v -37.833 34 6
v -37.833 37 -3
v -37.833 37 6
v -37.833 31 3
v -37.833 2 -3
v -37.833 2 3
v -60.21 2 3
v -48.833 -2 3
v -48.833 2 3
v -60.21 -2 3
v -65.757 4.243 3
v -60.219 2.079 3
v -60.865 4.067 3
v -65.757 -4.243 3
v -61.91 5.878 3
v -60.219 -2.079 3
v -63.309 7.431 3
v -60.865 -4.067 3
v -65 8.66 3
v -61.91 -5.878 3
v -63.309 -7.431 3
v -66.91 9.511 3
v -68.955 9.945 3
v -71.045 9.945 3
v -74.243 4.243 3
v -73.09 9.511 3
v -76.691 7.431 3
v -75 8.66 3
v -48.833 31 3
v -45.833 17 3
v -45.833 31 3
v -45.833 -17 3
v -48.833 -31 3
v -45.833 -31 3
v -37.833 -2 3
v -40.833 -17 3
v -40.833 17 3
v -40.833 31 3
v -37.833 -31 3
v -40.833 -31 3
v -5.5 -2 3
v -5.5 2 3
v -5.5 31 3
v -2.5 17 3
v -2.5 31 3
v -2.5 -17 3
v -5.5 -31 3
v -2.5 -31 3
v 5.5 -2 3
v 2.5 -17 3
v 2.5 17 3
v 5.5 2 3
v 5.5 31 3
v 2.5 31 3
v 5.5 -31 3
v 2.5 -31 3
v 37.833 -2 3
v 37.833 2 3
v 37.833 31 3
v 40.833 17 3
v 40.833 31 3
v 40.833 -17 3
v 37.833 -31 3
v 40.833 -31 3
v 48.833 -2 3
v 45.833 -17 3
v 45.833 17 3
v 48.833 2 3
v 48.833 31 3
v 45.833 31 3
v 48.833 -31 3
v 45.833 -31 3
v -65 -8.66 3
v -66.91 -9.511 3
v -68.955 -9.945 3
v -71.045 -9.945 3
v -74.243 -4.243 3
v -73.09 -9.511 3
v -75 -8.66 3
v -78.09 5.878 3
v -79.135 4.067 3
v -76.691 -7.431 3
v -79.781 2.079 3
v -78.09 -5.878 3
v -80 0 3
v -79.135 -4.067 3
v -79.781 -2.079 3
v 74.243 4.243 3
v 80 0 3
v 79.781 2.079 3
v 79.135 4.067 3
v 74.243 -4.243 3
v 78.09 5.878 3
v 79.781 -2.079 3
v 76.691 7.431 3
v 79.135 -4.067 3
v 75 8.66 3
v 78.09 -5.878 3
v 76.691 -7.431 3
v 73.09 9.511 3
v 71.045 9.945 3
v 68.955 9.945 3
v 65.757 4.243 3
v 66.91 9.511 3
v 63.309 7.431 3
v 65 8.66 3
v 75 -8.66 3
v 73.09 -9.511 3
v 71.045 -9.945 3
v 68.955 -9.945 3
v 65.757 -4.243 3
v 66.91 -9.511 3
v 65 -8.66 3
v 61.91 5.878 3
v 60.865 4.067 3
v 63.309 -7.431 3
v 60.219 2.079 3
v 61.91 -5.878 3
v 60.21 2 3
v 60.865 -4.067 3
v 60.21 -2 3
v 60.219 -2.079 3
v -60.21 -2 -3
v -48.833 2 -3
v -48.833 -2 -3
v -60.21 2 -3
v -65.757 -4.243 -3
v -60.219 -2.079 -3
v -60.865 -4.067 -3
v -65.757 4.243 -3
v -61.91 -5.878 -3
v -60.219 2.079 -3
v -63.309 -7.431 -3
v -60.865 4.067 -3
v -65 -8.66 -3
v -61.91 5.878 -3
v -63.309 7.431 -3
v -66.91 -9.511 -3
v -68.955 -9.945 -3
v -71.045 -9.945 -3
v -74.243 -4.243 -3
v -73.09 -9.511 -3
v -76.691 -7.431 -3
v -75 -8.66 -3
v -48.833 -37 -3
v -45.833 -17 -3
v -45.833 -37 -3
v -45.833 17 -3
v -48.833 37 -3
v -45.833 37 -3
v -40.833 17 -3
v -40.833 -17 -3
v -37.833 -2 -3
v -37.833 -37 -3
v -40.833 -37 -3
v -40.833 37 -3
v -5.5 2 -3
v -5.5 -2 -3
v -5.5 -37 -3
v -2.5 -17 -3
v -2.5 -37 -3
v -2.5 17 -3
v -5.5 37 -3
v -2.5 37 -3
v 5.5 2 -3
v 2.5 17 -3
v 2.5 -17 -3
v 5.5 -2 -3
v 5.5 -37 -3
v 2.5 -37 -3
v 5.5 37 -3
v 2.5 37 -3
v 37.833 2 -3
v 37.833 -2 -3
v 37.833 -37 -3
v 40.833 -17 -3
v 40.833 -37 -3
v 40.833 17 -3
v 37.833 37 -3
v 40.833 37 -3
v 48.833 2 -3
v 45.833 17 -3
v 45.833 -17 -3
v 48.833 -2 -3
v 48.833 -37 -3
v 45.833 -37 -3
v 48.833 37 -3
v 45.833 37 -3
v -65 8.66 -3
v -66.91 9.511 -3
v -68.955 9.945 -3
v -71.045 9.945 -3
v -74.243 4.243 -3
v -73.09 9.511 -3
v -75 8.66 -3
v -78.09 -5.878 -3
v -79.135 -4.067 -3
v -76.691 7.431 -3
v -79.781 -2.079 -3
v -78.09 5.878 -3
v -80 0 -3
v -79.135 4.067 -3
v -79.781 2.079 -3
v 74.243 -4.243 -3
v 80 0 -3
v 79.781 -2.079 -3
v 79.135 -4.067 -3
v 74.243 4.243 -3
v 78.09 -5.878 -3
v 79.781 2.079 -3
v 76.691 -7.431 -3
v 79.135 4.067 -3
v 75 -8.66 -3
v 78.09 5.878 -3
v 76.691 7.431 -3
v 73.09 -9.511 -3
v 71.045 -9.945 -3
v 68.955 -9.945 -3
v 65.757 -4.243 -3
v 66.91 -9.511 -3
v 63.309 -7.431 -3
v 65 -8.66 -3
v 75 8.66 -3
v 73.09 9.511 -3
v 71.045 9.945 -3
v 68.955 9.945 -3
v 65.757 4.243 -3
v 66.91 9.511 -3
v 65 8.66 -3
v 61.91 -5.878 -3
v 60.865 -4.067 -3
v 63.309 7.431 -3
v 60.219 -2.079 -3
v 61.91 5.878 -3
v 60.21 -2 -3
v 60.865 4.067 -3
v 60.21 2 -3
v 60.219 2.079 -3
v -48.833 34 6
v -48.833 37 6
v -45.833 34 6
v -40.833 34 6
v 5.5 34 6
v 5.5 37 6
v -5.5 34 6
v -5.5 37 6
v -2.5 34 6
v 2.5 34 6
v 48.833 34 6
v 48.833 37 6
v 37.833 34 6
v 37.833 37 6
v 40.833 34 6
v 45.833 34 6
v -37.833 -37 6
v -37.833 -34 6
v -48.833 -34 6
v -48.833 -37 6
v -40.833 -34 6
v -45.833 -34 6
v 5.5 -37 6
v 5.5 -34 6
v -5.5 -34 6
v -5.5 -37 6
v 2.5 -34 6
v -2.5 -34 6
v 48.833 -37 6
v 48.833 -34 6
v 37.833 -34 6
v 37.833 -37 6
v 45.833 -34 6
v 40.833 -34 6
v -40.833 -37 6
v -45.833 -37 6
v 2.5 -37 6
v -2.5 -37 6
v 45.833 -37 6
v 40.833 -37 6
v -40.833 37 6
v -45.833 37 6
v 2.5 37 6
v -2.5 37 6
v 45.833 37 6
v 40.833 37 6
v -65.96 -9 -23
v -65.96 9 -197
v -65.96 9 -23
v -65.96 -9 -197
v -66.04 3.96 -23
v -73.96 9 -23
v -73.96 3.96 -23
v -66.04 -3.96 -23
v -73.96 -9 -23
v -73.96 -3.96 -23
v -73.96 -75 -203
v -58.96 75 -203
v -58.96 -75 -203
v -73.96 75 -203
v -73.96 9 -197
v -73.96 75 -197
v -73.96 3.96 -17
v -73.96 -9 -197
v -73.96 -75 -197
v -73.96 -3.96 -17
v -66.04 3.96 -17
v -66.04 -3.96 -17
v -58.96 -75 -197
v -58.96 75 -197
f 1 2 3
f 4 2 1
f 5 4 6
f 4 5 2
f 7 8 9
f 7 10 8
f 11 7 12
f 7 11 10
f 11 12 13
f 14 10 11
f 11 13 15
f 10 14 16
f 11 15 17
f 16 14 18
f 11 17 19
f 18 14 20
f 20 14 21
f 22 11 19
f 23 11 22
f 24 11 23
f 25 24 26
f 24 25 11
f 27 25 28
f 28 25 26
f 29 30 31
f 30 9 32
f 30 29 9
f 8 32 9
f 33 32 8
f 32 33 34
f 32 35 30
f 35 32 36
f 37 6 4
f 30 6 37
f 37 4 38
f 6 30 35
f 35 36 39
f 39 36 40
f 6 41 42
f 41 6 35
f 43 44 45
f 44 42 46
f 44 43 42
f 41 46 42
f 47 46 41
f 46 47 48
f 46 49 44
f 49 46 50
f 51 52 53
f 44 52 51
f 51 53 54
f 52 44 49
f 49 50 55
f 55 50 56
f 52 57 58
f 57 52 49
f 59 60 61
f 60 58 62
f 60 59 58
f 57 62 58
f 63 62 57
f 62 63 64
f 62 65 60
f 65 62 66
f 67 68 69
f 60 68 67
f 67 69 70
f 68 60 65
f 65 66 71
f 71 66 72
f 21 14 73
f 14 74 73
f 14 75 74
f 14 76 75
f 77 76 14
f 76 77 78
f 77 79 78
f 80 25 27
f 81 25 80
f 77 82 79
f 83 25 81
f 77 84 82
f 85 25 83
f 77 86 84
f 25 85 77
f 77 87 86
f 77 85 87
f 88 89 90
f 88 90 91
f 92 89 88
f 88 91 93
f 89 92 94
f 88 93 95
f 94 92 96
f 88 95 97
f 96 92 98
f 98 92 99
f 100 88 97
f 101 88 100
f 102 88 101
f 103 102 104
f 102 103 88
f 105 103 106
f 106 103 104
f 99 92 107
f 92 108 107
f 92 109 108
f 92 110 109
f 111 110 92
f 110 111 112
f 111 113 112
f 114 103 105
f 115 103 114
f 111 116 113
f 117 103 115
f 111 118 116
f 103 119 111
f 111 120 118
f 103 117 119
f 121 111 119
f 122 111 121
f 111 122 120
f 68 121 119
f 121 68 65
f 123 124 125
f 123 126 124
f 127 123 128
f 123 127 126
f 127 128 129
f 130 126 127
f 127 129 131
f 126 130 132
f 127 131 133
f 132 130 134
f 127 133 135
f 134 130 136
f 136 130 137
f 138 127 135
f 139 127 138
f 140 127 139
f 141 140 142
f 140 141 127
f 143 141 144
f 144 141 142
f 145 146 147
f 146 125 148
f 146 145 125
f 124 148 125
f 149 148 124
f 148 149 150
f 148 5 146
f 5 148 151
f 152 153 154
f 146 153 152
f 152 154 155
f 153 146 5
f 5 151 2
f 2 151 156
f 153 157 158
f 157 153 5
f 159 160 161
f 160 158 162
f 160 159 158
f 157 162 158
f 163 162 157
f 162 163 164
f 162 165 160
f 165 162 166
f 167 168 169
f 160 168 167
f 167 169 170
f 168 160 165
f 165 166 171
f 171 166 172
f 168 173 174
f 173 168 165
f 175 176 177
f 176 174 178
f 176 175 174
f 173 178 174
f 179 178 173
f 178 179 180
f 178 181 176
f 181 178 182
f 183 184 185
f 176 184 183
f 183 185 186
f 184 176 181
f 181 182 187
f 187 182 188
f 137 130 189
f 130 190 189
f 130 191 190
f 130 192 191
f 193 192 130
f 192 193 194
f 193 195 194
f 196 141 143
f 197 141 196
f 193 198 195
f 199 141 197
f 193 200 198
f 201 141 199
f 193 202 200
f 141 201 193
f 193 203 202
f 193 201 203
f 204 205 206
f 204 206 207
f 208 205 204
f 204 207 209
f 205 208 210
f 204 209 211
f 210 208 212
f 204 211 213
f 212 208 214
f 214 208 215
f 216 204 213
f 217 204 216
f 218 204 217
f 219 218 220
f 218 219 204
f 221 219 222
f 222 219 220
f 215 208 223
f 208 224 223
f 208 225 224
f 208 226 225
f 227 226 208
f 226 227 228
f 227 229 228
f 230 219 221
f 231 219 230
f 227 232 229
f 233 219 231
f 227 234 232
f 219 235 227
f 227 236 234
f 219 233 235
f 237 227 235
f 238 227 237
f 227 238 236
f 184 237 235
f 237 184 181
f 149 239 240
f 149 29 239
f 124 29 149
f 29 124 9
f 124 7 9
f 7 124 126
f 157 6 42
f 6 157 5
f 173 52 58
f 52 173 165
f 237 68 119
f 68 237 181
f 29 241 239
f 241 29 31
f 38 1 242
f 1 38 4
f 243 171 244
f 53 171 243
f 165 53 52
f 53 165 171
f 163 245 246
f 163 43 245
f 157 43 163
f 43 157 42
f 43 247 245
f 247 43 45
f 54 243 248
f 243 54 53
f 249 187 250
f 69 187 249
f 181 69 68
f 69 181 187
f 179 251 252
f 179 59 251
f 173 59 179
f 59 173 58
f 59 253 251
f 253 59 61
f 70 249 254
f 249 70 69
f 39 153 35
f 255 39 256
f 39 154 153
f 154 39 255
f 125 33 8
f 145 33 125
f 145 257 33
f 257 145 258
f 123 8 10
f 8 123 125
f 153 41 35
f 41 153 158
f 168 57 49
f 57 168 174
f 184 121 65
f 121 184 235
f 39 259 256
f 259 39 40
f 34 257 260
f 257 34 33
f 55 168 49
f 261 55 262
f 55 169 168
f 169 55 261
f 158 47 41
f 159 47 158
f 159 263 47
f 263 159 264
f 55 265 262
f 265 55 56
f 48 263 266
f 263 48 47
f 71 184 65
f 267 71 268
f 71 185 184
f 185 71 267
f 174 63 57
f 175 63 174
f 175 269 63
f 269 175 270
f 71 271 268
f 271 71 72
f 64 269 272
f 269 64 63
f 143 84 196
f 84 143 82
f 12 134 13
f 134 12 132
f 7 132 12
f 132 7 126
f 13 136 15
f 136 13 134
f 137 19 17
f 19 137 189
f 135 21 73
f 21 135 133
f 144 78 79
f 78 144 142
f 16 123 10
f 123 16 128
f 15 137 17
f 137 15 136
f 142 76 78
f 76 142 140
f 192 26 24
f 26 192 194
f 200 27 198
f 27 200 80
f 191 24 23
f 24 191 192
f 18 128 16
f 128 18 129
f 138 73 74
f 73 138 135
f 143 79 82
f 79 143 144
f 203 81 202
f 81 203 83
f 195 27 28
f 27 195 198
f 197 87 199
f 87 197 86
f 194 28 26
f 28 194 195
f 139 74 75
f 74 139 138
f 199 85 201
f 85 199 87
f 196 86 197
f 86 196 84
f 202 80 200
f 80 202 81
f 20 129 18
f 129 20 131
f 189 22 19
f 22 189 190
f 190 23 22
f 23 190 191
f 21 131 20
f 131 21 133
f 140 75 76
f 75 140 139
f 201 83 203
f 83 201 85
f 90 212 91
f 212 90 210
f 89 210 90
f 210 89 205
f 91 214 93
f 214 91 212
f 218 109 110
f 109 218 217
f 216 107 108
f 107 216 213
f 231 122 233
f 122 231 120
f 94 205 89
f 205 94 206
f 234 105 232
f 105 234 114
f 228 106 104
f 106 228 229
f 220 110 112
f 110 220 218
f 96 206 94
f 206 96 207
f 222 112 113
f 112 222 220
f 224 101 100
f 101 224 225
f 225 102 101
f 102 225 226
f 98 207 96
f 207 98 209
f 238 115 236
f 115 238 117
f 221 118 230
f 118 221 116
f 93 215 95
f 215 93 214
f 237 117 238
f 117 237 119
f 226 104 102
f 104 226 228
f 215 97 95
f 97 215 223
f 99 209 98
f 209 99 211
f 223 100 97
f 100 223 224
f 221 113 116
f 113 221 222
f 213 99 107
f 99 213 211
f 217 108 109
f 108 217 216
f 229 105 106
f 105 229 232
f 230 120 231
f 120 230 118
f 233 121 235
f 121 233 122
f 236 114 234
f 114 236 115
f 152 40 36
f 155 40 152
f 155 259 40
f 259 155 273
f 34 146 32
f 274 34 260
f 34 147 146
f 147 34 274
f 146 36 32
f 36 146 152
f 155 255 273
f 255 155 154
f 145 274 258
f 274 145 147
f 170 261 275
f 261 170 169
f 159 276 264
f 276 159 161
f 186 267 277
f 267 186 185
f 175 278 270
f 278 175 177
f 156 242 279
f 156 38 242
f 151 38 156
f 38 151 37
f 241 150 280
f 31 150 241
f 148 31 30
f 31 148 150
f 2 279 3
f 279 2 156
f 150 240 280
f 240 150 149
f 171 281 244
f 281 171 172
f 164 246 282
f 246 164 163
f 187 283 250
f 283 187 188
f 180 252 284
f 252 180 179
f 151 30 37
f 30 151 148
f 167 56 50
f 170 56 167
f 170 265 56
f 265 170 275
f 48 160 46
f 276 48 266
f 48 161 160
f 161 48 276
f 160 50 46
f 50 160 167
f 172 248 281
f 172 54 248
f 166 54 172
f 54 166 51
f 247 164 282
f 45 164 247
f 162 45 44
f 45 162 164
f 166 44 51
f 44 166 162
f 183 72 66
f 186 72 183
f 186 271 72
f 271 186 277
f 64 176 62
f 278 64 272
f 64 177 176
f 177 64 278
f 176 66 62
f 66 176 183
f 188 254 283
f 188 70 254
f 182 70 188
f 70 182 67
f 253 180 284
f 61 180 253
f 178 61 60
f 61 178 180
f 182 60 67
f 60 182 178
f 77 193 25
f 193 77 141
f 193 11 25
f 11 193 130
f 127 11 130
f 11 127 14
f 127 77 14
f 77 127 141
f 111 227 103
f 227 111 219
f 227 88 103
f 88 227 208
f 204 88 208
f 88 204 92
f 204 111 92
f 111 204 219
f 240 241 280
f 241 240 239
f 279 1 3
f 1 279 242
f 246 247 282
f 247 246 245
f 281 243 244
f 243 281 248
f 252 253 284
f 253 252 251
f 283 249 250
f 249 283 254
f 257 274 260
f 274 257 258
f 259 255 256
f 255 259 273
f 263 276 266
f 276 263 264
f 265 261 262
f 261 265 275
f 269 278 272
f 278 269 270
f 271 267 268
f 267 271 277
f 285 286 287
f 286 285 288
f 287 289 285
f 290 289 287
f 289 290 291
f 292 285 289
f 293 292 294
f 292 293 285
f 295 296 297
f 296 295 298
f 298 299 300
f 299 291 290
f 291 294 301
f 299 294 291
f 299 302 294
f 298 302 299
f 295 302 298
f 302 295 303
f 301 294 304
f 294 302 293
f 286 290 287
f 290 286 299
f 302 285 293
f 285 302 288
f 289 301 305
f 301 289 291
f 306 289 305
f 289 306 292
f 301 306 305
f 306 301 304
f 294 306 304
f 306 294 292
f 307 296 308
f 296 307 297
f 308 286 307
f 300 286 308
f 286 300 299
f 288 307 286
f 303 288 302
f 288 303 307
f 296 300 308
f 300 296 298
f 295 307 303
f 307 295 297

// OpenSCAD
/// ///
/// PIPETTE RACK v1; 2014 02 24 ///
/// by Tom Baden (thingyverse ID: tbaden) ///
/// thomas.baden@uni-tuebingen.de ///
/// tombaden.wordpress.com ///
/// ///

/////////////////////////////////////////////////////////////////////////////////


// CUSTOMIZABLE VARIABLES
1_or_2_sided = 2; // [1,2]
// (will automatically adjust #slots..)
Length = 130; // [50:300]
Height = 180; //[150:220]

Foot_Y = 150; // [100:200]
Foot_X = 15; // [10:30]
// how thick are all the pieces? - multiplyer
Stability = 2; // [1:4]
// (printer precision)
Tolerance = 0.4; // [0.1, 0.2, 0.3, 0.4, 0.5]
///////////////////////////////////////////////////////////////////////////////////////
///////////////////////////////////////////////////////////////////////////////////////
/// CUSTOMIZER CUTOFF: MODIFY ANYTHING BELOW HERE AT YOUR OWN RISK! ///////////////////
module customizer_cutoff(){};//////////////////////////////////////////////////////////
///////////////////////////////////////////////////////////////////////////////////////

sep = 20;

X = Length;
Z = Height;
Y = 18;

Wall_Y = 2*Stability;
Wall_Z = 3*Stability;
Wall_X = 4*Stability;


X_hanger = 11;
Y_hanger = 35;

slot_depth = 20;
slot_width = 5;

Foot_length = Foot_X;
Foot_width = Foot_Y;

R_end = 10;
R_end_inner = 6;
R_end_inner_minus = R_end_inner-Tolerance;
connect_width = sqrt(R_end_inner_minus*R_end_inner_minus*2);


Triangle_top = 30;

n_slots = round(X/50);

2_sided = 1_or_2_sided-1;

/////////////////// TOP (A)

module A(){
	cube([X,Wall_Y,Wall_Z], center = true ); // main beam
	translate([-X/2-R_end/2,0,0]){cylinder(r = R_end, h = Wall_Z, center = true );} // ends
	translate([X/2+R_end/2,0,0]){cylinder(r = R_end, h = Wall_Z, center = true );} // ends
	for (i = [1:n_slots]) { // protrusion 
		translate([-X/2+(i-0.5)*X/n_slots,-Y_hanger/2-Wall_Y/2,0]){cube([X_hanger,Y_hanger,Wall_Z], center = true );} // main
		translate([-X/2+(i-0.5)*X/n_slots,-Y_hanger-Wall_Y/2,Wall_Z/2]){rotate([45,0,0]){ cube([X_hanger,sqrt(2*(Wall_Z*Wall_Z)),sqrt(2*(Wall_Z*Wall_Z))], center = true );}} // slope

		if (2_sided == 1) {	
			translate([-X/2+(i-0.5)*X/n_slots,Y_hanger/2+Wall_Y/2,0]){cube([X_hanger,Y_hanger,Wall_Z], center = true );} 
		translate([-X/2+(i-0.5)*X/n_slots,+Y_hanger+Wall_Y/2,Wall_Z/2]){rotate([45,0,0]){ cube([X_hanger,sqrt(2*(Wall_Z*Wall_Z)),sqrt(2*(Wall_Z*Wall_Z))], center = true );}} // slope
		}
	}	
}
module A_sub(){
	translate([-X/2-R_end/2,0,0]){rotate([0,0,45]){
		cylinder($fn = 4, r = R_end_inner, h = Wall_Z, center = true );}} // end-hole
	translate([X/2+R_end/2,0,0]){rotate([0,0,45]){
		cylinder($fn = 4, r = R_end_inner, h = Wall_Z, center = true );}} // end-hole

	for (i = [1:n_slots]) { // slots
		translate([-X/2+(i-0.5)*X/n_slots,slot_depth/2-Y_hanger-Wall_Y/2,Wall_Z/2]){cube([slot_width,slot_depth,Wall_Z*2], center = true );}
		if (2_sided == 1) {
			translate([-X/2+(i-0.5)*X/n_slots,-slot_depth/2+Y_hanger+Wall_Y/2,Wall_Z/2]){cube([slot_width,slot_depth,Wall_Z*2], center = true);	}}
	}

	translate([0,-Y_hanger-Wall_Y*1.5,Wall_Z/2]){cube([X,Wall_Y*2,Wall_Z*2], center = true );} // Cut ends
	translate([0,Y_hanger+Wall_Y*1.5,Wall_Z/2]){cube([X,Wall_Y*2,Wall_Z*2], center = true );} // Cut ends
	translate([0,0,Wall_Z*1.5]){cube([X,(Y_hanger+Wall_Y)*2,Wall_Z], center = true );} // Cut top
}
difference(){A();A_sub();}

/////////////////// SIDE (B)



module B(){
	translate([-X/2-R_end/2-connect_width/2+Wall_X/2,0,-Z/2-Wall_Z/2-sep]){cube([Wall_X,Y,Z], center = true );} // main beam
	translate([-X/2-R_end/2,0,-sep]){rotate([0,0,45]){
		cylinder($fn = 4, r = R_end_inner_minus, h = Wall_Z, center = true );}} // connect_thingy
	translate([-X/2-R_end/2-connect_width/2+Foot_length/2,0,-Z-sep]){cube([Foot_length,Foot_width,Wall_Z], center = true );} // foot
//	translate([-X/2-R_end/2-connect_width/2+Wall_X/2,0,-sep-connect_width/2]){rotate([0,45,0]){cube([Triangle_top,Wall_Y,Triangle_top], center = true );}} // triangle
}
module B_sub(){

}
difference(){B();B_sub();}
